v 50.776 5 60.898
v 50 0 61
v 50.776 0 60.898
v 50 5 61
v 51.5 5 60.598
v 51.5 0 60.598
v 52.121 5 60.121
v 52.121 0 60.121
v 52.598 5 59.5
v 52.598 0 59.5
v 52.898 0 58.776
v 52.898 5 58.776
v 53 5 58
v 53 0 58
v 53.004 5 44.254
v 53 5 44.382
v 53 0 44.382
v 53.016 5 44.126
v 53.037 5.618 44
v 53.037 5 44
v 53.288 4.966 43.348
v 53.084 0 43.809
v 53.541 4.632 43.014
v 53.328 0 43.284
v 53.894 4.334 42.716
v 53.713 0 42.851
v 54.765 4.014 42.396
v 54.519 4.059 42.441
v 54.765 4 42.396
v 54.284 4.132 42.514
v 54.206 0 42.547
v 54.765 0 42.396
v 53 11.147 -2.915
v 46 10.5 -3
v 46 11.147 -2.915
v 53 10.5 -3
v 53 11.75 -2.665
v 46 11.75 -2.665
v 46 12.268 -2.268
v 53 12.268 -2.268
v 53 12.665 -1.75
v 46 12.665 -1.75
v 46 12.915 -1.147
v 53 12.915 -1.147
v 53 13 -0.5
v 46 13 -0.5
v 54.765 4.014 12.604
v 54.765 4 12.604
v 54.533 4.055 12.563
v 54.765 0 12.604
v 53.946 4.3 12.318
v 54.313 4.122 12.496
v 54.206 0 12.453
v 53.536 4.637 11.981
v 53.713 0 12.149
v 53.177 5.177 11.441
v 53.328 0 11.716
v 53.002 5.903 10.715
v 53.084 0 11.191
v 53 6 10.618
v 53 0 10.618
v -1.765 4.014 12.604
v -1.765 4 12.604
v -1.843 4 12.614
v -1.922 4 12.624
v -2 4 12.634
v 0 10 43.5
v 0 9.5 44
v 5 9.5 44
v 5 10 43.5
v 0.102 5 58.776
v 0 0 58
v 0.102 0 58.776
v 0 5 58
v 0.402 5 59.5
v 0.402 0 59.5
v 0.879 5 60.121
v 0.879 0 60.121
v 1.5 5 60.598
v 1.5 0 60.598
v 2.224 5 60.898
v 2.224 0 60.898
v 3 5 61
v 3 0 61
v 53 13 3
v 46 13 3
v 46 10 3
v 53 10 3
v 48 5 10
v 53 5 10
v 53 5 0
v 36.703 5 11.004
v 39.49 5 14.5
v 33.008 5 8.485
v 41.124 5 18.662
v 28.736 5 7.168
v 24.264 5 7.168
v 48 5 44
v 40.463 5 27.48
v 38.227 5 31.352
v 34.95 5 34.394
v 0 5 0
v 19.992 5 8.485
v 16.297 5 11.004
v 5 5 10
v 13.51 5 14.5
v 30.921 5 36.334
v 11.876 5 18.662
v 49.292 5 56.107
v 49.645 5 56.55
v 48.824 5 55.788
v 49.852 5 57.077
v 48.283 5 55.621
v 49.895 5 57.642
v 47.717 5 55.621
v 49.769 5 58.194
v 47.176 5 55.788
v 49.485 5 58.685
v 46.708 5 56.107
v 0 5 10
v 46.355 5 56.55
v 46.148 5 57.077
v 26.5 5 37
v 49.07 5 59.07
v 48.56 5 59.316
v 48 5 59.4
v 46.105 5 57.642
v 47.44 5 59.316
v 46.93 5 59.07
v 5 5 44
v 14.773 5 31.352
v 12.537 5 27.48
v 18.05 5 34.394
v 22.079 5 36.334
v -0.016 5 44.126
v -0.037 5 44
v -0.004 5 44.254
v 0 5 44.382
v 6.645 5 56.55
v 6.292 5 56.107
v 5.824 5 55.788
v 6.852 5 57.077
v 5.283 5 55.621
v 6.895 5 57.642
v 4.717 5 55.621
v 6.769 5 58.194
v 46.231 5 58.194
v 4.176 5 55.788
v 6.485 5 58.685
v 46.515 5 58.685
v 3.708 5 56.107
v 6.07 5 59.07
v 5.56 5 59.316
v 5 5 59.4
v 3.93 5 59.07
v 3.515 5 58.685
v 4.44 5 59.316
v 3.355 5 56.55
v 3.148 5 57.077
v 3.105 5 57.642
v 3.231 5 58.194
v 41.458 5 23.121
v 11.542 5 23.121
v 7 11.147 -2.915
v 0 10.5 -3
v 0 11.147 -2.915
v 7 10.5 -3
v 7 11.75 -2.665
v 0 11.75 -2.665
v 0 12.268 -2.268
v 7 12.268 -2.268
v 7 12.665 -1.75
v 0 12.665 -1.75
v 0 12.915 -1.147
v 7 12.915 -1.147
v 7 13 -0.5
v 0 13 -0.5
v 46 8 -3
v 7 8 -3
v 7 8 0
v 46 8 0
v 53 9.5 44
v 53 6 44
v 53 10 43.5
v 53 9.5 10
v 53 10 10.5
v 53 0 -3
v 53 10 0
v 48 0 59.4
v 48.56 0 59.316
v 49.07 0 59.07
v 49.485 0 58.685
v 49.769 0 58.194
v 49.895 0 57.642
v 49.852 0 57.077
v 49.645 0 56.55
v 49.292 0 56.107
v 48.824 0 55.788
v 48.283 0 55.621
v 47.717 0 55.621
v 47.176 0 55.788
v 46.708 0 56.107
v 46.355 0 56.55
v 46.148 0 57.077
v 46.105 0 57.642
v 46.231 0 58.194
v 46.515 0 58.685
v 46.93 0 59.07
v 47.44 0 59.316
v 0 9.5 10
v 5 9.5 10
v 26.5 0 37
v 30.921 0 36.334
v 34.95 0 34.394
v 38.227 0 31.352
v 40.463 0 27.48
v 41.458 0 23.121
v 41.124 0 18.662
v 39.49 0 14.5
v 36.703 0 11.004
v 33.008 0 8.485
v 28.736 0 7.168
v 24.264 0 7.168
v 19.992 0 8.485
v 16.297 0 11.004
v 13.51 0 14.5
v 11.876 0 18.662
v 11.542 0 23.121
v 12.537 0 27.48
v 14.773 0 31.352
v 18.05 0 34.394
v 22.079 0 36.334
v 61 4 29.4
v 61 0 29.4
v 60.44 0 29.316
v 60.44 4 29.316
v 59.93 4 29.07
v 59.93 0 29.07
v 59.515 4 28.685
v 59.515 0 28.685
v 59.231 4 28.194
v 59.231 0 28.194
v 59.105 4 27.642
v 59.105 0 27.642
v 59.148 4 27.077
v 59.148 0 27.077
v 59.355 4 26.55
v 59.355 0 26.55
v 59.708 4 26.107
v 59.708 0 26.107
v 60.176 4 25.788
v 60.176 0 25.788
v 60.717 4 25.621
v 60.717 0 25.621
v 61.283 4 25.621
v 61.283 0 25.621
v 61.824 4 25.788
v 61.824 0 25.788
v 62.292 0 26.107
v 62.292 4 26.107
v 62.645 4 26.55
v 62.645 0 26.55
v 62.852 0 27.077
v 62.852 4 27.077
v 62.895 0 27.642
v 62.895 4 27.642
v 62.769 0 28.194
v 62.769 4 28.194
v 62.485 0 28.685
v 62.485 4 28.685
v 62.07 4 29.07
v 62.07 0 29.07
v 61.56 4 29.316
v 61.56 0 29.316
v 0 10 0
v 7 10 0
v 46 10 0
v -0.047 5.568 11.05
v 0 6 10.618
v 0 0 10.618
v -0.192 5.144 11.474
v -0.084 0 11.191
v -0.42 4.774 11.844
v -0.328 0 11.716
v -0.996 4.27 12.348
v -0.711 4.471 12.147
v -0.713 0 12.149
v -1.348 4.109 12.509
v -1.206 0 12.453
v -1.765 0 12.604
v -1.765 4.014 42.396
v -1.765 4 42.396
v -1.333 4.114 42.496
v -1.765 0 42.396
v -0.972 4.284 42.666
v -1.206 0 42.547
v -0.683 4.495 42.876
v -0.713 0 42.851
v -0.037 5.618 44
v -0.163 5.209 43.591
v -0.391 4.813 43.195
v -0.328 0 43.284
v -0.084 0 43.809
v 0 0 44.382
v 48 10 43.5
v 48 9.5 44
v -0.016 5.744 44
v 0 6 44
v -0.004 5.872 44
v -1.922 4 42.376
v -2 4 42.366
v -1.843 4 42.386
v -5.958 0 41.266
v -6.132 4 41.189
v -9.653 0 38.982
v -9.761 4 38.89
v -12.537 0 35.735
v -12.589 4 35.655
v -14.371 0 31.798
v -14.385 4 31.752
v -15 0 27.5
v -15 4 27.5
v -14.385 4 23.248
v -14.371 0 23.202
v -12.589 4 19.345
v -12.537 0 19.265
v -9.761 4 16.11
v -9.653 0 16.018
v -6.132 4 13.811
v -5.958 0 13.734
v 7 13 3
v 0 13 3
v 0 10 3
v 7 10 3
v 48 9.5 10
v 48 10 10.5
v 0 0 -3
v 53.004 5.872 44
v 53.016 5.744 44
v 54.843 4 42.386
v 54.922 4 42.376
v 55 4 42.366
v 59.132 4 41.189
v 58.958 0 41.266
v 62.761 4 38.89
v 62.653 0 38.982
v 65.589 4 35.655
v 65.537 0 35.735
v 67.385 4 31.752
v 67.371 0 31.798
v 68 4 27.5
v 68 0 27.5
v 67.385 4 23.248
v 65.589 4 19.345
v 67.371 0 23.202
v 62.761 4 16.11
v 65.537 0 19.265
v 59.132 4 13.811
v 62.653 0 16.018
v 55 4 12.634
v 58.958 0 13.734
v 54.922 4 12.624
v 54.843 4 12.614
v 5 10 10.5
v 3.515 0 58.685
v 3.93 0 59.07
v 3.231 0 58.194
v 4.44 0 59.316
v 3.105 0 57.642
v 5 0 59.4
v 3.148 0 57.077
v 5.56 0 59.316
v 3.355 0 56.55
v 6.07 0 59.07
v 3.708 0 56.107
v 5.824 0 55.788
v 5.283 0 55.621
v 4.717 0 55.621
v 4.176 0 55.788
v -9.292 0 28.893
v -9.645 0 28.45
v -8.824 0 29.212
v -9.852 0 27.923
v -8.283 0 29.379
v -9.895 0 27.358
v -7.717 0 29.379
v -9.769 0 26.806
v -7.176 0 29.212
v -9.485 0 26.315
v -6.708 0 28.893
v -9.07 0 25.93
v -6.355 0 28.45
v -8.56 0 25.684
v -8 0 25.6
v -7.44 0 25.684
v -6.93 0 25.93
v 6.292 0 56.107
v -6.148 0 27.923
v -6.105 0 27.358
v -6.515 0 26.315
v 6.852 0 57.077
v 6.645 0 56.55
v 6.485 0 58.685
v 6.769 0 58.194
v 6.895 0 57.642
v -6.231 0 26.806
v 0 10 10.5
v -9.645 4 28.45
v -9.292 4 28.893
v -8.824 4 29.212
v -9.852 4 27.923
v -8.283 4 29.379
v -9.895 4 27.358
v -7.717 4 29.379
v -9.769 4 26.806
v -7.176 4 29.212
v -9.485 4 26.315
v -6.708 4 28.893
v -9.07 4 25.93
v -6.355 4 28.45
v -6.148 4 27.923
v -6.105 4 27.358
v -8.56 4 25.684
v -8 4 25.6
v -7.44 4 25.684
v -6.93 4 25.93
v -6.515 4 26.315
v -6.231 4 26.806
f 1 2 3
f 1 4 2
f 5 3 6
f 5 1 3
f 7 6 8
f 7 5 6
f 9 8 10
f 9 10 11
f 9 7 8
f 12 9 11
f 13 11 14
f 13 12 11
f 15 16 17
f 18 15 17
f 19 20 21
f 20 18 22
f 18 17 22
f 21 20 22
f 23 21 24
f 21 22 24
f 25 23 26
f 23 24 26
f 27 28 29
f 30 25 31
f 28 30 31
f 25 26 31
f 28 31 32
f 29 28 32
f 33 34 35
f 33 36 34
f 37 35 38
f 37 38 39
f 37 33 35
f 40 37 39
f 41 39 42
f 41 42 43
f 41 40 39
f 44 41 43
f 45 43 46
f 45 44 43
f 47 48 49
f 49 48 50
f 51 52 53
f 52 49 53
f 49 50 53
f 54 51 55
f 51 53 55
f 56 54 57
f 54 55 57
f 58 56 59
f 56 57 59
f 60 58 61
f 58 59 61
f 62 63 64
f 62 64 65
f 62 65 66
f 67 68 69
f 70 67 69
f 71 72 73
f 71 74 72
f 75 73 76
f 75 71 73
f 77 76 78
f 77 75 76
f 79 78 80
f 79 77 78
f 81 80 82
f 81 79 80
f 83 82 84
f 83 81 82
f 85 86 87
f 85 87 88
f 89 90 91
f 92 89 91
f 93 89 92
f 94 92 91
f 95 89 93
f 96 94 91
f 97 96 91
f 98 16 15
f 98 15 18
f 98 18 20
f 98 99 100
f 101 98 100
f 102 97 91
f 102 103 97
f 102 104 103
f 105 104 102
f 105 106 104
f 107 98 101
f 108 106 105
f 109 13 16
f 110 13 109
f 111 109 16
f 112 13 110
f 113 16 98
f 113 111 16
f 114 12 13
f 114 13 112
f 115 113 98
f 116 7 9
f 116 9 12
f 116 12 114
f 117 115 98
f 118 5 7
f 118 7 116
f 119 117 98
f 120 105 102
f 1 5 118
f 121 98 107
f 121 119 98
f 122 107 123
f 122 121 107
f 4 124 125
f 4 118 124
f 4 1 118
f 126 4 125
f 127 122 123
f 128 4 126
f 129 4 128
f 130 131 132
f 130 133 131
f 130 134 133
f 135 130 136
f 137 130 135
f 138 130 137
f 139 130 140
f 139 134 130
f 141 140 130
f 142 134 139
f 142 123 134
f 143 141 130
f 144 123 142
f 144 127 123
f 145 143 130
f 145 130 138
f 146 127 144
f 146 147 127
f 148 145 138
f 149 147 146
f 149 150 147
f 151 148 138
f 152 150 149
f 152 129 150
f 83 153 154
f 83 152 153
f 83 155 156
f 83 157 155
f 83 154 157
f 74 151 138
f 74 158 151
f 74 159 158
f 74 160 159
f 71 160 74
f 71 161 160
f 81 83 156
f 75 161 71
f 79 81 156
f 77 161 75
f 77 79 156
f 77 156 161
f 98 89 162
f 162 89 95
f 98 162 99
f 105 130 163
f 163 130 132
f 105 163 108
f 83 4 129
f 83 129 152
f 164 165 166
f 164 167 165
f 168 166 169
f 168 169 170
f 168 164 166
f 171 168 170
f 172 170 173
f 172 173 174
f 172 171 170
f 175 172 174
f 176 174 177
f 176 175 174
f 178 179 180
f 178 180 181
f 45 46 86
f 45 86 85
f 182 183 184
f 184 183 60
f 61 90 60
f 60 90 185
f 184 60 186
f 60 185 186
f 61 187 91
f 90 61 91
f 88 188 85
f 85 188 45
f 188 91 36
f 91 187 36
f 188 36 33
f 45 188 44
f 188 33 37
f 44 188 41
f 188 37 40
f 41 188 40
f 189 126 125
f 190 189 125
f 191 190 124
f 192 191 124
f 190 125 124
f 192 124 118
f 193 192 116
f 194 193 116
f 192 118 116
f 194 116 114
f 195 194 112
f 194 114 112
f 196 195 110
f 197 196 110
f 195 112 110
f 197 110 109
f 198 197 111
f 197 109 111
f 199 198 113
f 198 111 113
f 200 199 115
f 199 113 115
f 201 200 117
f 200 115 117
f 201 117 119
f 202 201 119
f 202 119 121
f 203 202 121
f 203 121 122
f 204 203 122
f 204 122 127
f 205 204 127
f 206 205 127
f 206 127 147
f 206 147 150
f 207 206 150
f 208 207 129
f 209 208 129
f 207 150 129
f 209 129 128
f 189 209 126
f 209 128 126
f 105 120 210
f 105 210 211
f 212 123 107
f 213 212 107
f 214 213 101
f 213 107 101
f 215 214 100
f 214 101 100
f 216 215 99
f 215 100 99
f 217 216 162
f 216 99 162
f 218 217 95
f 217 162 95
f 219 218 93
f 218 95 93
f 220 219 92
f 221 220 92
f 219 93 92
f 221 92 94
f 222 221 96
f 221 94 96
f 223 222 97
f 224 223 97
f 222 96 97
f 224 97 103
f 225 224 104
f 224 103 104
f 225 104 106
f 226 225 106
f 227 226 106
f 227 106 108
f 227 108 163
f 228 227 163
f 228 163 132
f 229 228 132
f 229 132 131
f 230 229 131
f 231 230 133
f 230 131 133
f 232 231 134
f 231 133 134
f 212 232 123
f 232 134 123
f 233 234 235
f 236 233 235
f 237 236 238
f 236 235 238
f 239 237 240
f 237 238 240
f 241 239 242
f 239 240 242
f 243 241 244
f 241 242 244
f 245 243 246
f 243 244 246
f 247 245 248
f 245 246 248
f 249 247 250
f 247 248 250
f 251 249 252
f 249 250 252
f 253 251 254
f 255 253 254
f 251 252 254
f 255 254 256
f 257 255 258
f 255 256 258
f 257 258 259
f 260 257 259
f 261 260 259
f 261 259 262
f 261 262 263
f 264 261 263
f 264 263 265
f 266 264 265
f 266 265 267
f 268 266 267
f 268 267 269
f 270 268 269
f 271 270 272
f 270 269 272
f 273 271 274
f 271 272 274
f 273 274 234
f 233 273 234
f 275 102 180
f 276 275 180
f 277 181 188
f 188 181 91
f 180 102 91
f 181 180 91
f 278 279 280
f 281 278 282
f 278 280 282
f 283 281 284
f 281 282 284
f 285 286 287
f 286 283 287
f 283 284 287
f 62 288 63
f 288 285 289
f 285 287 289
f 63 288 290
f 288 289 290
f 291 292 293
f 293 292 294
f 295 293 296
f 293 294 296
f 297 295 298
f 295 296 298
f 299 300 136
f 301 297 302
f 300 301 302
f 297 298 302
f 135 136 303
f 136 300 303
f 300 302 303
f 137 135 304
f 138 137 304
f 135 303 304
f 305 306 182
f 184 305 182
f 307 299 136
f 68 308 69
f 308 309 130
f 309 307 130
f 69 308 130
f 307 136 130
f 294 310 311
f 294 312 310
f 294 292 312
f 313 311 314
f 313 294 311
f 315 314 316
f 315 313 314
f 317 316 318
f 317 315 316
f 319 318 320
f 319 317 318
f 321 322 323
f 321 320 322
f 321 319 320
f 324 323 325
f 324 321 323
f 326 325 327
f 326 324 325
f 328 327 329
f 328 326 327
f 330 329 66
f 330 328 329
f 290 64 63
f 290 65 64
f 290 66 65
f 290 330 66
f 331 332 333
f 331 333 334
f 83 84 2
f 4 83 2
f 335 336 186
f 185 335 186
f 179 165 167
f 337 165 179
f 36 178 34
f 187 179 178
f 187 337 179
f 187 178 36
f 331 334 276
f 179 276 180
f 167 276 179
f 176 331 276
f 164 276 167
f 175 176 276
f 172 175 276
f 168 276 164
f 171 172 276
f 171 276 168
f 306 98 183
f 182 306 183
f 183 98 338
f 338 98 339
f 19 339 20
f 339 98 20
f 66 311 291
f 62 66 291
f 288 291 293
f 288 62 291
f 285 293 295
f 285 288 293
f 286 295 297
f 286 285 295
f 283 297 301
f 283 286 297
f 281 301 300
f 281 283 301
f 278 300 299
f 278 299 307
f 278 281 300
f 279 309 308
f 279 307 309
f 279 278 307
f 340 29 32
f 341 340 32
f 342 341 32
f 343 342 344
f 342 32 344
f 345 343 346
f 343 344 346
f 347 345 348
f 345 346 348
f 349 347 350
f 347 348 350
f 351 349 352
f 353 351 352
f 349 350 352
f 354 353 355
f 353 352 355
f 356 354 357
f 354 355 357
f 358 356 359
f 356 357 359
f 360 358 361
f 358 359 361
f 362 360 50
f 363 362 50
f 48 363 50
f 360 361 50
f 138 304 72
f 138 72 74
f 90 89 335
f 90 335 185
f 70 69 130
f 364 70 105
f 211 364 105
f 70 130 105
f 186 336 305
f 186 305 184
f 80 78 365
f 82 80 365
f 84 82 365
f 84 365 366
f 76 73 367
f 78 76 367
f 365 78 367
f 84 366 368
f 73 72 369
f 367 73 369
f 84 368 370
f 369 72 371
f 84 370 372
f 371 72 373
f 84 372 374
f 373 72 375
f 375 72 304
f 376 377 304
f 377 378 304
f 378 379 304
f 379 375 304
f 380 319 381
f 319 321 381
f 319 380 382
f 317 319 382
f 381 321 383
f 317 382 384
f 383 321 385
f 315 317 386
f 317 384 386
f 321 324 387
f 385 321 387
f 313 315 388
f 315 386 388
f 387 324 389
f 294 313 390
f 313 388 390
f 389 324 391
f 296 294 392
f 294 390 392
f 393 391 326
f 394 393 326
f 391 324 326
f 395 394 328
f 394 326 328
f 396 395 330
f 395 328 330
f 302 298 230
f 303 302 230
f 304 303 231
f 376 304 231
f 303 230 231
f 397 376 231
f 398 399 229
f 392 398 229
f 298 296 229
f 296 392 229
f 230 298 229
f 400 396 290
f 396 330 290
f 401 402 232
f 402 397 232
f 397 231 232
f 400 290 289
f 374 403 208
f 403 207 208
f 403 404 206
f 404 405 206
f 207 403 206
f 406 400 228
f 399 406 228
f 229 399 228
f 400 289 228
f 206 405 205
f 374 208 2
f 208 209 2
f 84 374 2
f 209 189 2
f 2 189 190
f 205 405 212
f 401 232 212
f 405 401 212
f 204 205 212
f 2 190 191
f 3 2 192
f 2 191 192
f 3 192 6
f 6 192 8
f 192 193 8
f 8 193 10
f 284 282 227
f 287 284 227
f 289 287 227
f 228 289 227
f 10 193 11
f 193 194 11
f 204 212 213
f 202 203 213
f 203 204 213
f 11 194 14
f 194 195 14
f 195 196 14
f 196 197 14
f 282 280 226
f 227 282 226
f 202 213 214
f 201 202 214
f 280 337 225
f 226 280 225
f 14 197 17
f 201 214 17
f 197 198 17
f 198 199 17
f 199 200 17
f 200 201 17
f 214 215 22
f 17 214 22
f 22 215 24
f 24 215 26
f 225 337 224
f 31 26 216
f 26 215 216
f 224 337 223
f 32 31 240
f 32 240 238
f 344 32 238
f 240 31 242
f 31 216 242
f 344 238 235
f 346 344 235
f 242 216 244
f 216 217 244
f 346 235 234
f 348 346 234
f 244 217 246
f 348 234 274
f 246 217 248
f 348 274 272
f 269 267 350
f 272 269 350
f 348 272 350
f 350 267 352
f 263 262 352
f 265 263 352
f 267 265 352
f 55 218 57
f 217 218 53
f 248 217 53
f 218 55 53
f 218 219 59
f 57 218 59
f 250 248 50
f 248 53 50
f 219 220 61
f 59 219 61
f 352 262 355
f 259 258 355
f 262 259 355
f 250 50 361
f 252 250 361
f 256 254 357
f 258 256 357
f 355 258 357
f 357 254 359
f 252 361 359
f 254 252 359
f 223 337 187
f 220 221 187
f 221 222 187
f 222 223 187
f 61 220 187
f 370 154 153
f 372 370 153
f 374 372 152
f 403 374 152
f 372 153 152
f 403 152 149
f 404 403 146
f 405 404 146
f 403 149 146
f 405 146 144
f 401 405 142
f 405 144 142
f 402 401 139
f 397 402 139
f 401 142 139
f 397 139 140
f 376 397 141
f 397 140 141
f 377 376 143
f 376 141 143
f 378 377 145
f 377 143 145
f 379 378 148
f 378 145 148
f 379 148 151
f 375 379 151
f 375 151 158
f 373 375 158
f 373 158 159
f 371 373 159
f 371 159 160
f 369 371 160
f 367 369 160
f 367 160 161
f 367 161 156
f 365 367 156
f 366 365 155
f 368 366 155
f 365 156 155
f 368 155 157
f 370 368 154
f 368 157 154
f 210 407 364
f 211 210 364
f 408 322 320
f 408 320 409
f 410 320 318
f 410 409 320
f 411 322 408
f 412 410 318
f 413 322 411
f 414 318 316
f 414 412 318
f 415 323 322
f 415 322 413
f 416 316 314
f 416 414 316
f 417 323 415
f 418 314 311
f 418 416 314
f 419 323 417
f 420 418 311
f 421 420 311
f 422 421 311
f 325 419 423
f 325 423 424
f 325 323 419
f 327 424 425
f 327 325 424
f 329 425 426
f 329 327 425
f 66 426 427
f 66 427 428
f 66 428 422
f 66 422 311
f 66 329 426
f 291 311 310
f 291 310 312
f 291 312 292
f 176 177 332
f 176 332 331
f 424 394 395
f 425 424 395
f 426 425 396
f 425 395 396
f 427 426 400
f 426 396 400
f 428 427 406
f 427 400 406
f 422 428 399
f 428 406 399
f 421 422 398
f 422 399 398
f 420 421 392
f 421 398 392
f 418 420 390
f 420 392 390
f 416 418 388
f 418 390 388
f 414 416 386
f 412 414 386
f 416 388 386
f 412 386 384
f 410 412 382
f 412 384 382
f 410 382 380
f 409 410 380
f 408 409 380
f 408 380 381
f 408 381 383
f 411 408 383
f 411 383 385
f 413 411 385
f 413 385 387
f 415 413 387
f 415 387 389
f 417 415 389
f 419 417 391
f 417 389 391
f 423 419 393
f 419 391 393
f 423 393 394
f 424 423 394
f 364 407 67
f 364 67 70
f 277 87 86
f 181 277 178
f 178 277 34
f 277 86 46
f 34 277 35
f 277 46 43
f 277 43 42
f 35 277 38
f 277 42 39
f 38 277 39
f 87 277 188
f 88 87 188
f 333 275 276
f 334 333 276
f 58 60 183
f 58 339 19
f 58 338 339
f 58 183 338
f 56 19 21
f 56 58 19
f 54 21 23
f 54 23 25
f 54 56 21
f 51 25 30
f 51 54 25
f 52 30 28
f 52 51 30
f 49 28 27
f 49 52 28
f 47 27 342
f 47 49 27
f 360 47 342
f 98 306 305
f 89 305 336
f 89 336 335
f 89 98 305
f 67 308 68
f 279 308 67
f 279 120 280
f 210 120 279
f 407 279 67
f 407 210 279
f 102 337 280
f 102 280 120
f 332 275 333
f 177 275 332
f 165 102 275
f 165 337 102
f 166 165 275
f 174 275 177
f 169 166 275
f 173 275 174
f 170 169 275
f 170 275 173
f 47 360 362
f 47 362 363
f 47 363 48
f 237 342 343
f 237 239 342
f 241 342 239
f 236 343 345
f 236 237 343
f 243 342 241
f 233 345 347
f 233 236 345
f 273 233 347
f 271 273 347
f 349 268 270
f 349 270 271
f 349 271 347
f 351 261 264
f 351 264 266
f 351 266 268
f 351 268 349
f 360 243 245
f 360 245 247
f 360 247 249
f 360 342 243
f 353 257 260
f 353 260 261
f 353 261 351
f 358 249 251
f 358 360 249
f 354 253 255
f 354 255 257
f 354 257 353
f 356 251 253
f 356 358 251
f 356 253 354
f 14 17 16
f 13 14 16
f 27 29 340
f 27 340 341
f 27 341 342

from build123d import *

# Parameters (mm, degrees)
SKETCH1_W           = 53
SKETCH1_H           = 61
BOSS_EXTRUDE1_DEPTH = 5
SKETCH2_W           = 5
SKETCH2_H           = 34
BOSS_EXTRUDE2_DEPTH = 5
SKETCH3_W           = 53
SKETCH3_H           = 5
BOSS_EXTRUDE3_DEPTH = 3
SKETCH4_W           = 53
SKETCH4_H           = 3
BOSS_EXTRUDE4_DEPTH = 8
SKETCH5_W           = 53
SKETCH5_H           = 3
BOSS_EXTRUDE5_DEPTH = 3
CUT_EXTRUDE1_REACH  = 83.847
SKETCH6_W           = 19.5
SKETCH6_H           = 6
CHAMFER1_SIZE       = 0.5
FILLET1_R           = 2.5
SKETCH7_R           = 15
CUT_EXTRUDE2_DEPTH  = 5
FILLET2_R           = 3
SKETCH8_W           = 39
SKETCH8_H           = 3
BOSS_EXTRUDE6_DEPTH = 3
SKETCH10_R          = 1.9
BOSS_EXTRUDE7_DEPTH = 4
FILLET3_START       = 4
FILLET3_DEPTH       = 2
FILLET3_2_DEPTH     = 5
FILLET3_START_2     = 10
FILLET3_3_DEPTH     = 34.381943016
SKETCH11_R          = 1.9
CUT_EXTRUDE3_DEPTH  = 5


with BuildPart() as part:
    # Sketch1 → Boss-Extrude1 (new body)
    with BuildSketch(Plane(origin=(0, 0, 0), x_dir=(1, 0, 0), z_dir=(0, 1, 0))):
        with Locations((26.5, -30.5)):
            Rectangle(SKETCH1_W, SKETCH1_H)
    extrude(amount=BOSS_EXTRUDE1_DEPTH)

    # Sketch2 → Boss-Extrude2 (add)
    with BuildSketch(Plane(origin=(0, 5, 0), x_dir=(1, 0, 0), z_dir=(0, 1, 0))):
        with Locations((2.5, -27)):
            Rectangle(SKETCH2_W, SKETCH2_H)
        with Locations((50.5, -27)):
            Rectangle(SKETCH2_W, SKETCH2_H)
    extrude(amount=BOSS_EXTRUDE2_DEPTH)

    # Sketch3 → Boss-Extrude3 (add)
    with BuildSketch(Plane(origin=(0, 0, 0), x_dir=(-1, 0, 0), z_dir=(0, 0, -1))):
        with Locations((-26.5, 2.5)):
            Rectangle(SKETCH3_W, SKETCH3_H)
    extrude(amount=BOSS_EXTRUDE3_DEPTH)

    # Sketch4 → Boss-Extrude4 (add)
    with BuildSketch(Plane(origin=(0, 5, 0), x_dir=(1, 0, 0), z_dir=(0, 1, 0))):
        with Locations((26.5, 1.5)):
            Rectangle(SKETCH4_W, SKETCH4_H)
    extrude(amount=BOSS_EXTRUDE4_DEPTH)

    # Sketch5 → Boss-Extrude5 (add)
    with BuildSketch(Plane.XY):
        with Locations((26.5, 11.5)):
            Rectangle(SKETCH5_W, SKETCH5_H)
    extrude(amount=BOSS_EXTRUDE5_DEPTH)

    # Cut-Extrude1: up to this face of the body (flat: up to its plane)
    cut_extrude1_end = Plane(part.part.faces().sort_by_distance((26.5, 5, 30.911337712))[0])
    # Sketch6 → Cut-Extrude1 (cut, up to the picked face)
    with BuildSketch(Plane(origin=(0, 13, 0), x_dir=(1, 0, 0), z_dir=(0, 1, 0)), mode=Mode.PRIVATE) as cut_extrude1_sk1:
        with Locations((36.25, 0)):
            Rectangle(SKETCH6_W, SKETCH6_H)
    cut_extrude1_tool1 = split(extrude(cut_extrude1_sk1.sketch, amount=-CUT_EXTRUDE1_REACH, mode=Mode.PRIVATE), bisect_by=cut_extrude1_end, keep=Keep.BOTH, mode=Mode.PRIVATE)
    # Sketch6 → Cut-Extrude1 (cut, up to the picked face)
    with BuildSketch(Plane(origin=(0, 13, 0), x_dir=(1, 0, 0), z_dir=(0, 1, 0)), mode=Mode.PRIVATE) as cut_extrude1_sk2:
        with Locations((16.75, 0)):
            Rectangle(SKETCH6_W, SKETCH6_H)
    cut_extrude1_tool2 = split(extrude(cut_extrude1_sk2.sketch, amount=-CUT_EXTRUDE1_REACH, mode=Mode.PRIVATE), bisect_by=cut_extrude1_end, keep=Keep.BOTH, mode=Mode.PRIVATE)
    add(cut_extrude1_tool1.solids().sort_by(Axis((36.25, 13, 0), (0, -1, 0)))[0], mode=Mode.SUBTRACT)
    add(cut_extrude1_tool2.solids().sort_by(Axis((16.75, 13, 0), (0, -1, 0)))[0], mode=Mode.SUBTRACT)

    # Chamfer1
    chamfer1_edges = [part.edges().sort_by_distance(p)[0] for p in [
        (2.5, 10, 10),
        (2.5, 10, 44),
        (50.5, 10, 44),
        (50.5, 10, 10),
    ]]
    chamfer(chamfer1_edges, length=CHAMFER1_SIZE)

    # Fillet1
    fillet1_edges = [part.edges().sort_by_distance(p)[0] for p in [
        (3.5, 13, -3),
        (49.5, 13, -3),
    ]]
    fillet(fillet1_edges, radius=FILLET1_R)

    # Sketch7 → Cut-Extrude2 (cut)
    with BuildSketch(Plane(origin=(0, 5, 0), x_dir=(1, 0, 0), z_dir=(0, 1, 0))):
        with Locations(Location((26.5, -22, 0), (0, 0, 270))):
            Circle(SKETCH7_R)
    extrude(amount=-CUT_EXTRUDE2_DEPTH, mode=Mode.SUBTRACT)

    # Fillet2
    fillet2_edges = [part.edges().sort_by_distance(p)[0] for p in [
        (53, 2.5, 61),
        (0, 2.5, 61),
    ]]
    fillet(fillet2_edges, radius=FILLET2_R)

    # Sketch8 → Boss-Extrude6 (add)
    with BuildSketch(Plane(origin=(0, 5, 0), x_dir=(1, 0, 0), z_dir=(0, 1, 0))):
        with Locations((26.5, 1.5)):
            Rectangle(SKETCH8_W, SKETCH8_H)
    extrude(amount=BOSS_EXTRUDE6_DEPTH)

    # Sketch10 → Boss-Extrude7 (add)
    # profile 1 of 2: a face of its own
    with BuildSketch(Plane.XZ):
        with BuildLine():
            Line((53, 12.5), (53, 42.5))
            ThreePointArc((53, 42.5), (68, 27.5), (53, 12.5))
        make_face()
        with Locations(Location((61, 27.5, 0), (0, 0, 90))):
            Circle(SKETCH10_R, mode=Mode.SUBTRACT)
    # profile 2 of 2: a face of its own
    with BuildSketch(Plane.XZ):
        with BuildLine():
            Line((0, 12.5), (0, 42.5))
            ThreePointArc((0, 42.5), (-15, 27.5), (0, 12.5))
        make_face()
        with Locations(Location((-8, 27.5, 0), (0, 0, 270))):
            Circle(SKETCH10_R, mode=Mode.SUBTRACT)
    extrude(amount=-BOSS_EXTRUDE7_DEPTH)

    # Fillet3: read off the stored shape, not the designer's step
    # Fillet3 outline → Fillet3 (add)
    with BuildSketch(Plane(origin=(0, 0, 0), x_dir=(1, 0, 0), z_dir=(0, 1, 0)).offset(FILLET3_START)):
        with BuildLine():
            ThreePointArc((0, -10.618056984), (-0.504909997, -11.946479312), (-1.764705882, -12.604167927))
            ThreePointArc((-1.764705882, -12.604167927), (-15, -27.5), (-1.764705882, -42.395832073))
            ThreePointArc((-1.764705882, -42.395832073), (-0.639238058, -42.916225808), (-0.03680884, -44))
            Line((-0.03680884, -44), (0, -44))
            Line((0, -44), (0, -10.618056984))
        make_face()
        with BuildLine():
            Line((53, -44), (53.03680884, -44))
            ThreePointArc((53.03680884, -44), (53.639238058, -42.916225808), (54.764705882, -42.395832073))
            ThreePointArc((54.764705882, -42.395832073), (68, -27.5), (54.764705882, -12.604167927))
            ThreePointArc((54.764705882, -12.604167927), (53.504909997, -11.946479312), (53, -10.618056984))
            Line((53, -10.618056984), (53, -44))
        make_face()
    extrude(amount=FILLET3_DEPTH)

    # Fillet3 2 outline → Fillet3 2 (add)
    with BuildSketch(Plane(origin=(0, 0, 0), x_dir=(1, 0, 0), z_dir=(0, 1, 0))):
        with BuildLine():
            Line((0, -12.5), (0, -10.618056984))
            ThreePointArc((0, -10.618056984), (-0.504909997, -11.946479312), (-1.764705882, -12.604167927))
            ThreePointArc((-1.764705882, -12.604167927), (-0.883888823, -12.526064627), (0, -12.5))
        make_face()
        with BuildLine():
            ThreePointArc((0, -42.5), (-0.883888823, -42.473935373), (-1.764705882, -42.395832073))
            ThreePointArc((-1.764705882, -42.395832073), (-0.504909997, -43.053520688), (0, -44.381943016))
            Line((0, -44.381943016), (0, -42.5))
        make_face()
        with BuildLine():
            ThreePointArc((53, -44.381943016), (53.504909997, -43.053520688), (54.764705882, -42.395832073))
            ThreePointArc((54.764705882, -42.395832073), (53.883888823, -42.473935373), (53, -42.5))
            Line((53, -42.5), (53, -44.381943016))
        make_face()
        with BuildLine():
            ThreePointArc((53, -12.5), (53.883888823, -12.526064627), (54.764705882, -12.604167927))
            ThreePointArc((54.764705882, -12.604167927), (53.504909997, -11.946479312), (53, -10.618056984))
            Line((53, -10.618056984), (53, -12.5))
        make_face()
    extrude(amount=FILLET3_2_DEPTH)

    # Fillet3 3 outline → Fillet3 3 (cut)
    with BuildSketch(Plane.XY.offset(FILLET3_START_2)):
        with BuildLine():
            Line((-16, 4), (-2, 4))
            ThreePointArc((-2, 4), (-0.585786438, 4.585786438), (0, 6))
            Line((0, 6), (-16, 6))
            Line((-16, 6), (-16, 4))
        make_face()
        with BuildLine():
            ThreePointArc((53, 6), (53.585786438, 4.585786438), (55, 4))
            Line((55, 4), (69, 4))
            Line((69, 4), (69, 6))
            Line((69, 6), (53, 6))
        make_face()
    extrude(amount=FILLET3_3_DEPTH, mode=Mode.SUBTRACT)

    # Sketch11 → Cut-Extrude3 (cut)
    with BuildSketch(Plane(origin=(0, 5, 0), x_dir=(1, 0, 0), z_dir=(0, 1, 0))):
        with Locations(Location((5, -57.5, 0), (0, 0, 270))):
            Circle(SKETCH11_R)
        with Locations(Location((48, -57.5, 0), (0, 0, 270))):
            Circle(SKETCH11_R)
    extrude(amount=-CUT_EXTRUDE3_DEPTH, mode=Mode.SUBTRACT)


solid = part.part
